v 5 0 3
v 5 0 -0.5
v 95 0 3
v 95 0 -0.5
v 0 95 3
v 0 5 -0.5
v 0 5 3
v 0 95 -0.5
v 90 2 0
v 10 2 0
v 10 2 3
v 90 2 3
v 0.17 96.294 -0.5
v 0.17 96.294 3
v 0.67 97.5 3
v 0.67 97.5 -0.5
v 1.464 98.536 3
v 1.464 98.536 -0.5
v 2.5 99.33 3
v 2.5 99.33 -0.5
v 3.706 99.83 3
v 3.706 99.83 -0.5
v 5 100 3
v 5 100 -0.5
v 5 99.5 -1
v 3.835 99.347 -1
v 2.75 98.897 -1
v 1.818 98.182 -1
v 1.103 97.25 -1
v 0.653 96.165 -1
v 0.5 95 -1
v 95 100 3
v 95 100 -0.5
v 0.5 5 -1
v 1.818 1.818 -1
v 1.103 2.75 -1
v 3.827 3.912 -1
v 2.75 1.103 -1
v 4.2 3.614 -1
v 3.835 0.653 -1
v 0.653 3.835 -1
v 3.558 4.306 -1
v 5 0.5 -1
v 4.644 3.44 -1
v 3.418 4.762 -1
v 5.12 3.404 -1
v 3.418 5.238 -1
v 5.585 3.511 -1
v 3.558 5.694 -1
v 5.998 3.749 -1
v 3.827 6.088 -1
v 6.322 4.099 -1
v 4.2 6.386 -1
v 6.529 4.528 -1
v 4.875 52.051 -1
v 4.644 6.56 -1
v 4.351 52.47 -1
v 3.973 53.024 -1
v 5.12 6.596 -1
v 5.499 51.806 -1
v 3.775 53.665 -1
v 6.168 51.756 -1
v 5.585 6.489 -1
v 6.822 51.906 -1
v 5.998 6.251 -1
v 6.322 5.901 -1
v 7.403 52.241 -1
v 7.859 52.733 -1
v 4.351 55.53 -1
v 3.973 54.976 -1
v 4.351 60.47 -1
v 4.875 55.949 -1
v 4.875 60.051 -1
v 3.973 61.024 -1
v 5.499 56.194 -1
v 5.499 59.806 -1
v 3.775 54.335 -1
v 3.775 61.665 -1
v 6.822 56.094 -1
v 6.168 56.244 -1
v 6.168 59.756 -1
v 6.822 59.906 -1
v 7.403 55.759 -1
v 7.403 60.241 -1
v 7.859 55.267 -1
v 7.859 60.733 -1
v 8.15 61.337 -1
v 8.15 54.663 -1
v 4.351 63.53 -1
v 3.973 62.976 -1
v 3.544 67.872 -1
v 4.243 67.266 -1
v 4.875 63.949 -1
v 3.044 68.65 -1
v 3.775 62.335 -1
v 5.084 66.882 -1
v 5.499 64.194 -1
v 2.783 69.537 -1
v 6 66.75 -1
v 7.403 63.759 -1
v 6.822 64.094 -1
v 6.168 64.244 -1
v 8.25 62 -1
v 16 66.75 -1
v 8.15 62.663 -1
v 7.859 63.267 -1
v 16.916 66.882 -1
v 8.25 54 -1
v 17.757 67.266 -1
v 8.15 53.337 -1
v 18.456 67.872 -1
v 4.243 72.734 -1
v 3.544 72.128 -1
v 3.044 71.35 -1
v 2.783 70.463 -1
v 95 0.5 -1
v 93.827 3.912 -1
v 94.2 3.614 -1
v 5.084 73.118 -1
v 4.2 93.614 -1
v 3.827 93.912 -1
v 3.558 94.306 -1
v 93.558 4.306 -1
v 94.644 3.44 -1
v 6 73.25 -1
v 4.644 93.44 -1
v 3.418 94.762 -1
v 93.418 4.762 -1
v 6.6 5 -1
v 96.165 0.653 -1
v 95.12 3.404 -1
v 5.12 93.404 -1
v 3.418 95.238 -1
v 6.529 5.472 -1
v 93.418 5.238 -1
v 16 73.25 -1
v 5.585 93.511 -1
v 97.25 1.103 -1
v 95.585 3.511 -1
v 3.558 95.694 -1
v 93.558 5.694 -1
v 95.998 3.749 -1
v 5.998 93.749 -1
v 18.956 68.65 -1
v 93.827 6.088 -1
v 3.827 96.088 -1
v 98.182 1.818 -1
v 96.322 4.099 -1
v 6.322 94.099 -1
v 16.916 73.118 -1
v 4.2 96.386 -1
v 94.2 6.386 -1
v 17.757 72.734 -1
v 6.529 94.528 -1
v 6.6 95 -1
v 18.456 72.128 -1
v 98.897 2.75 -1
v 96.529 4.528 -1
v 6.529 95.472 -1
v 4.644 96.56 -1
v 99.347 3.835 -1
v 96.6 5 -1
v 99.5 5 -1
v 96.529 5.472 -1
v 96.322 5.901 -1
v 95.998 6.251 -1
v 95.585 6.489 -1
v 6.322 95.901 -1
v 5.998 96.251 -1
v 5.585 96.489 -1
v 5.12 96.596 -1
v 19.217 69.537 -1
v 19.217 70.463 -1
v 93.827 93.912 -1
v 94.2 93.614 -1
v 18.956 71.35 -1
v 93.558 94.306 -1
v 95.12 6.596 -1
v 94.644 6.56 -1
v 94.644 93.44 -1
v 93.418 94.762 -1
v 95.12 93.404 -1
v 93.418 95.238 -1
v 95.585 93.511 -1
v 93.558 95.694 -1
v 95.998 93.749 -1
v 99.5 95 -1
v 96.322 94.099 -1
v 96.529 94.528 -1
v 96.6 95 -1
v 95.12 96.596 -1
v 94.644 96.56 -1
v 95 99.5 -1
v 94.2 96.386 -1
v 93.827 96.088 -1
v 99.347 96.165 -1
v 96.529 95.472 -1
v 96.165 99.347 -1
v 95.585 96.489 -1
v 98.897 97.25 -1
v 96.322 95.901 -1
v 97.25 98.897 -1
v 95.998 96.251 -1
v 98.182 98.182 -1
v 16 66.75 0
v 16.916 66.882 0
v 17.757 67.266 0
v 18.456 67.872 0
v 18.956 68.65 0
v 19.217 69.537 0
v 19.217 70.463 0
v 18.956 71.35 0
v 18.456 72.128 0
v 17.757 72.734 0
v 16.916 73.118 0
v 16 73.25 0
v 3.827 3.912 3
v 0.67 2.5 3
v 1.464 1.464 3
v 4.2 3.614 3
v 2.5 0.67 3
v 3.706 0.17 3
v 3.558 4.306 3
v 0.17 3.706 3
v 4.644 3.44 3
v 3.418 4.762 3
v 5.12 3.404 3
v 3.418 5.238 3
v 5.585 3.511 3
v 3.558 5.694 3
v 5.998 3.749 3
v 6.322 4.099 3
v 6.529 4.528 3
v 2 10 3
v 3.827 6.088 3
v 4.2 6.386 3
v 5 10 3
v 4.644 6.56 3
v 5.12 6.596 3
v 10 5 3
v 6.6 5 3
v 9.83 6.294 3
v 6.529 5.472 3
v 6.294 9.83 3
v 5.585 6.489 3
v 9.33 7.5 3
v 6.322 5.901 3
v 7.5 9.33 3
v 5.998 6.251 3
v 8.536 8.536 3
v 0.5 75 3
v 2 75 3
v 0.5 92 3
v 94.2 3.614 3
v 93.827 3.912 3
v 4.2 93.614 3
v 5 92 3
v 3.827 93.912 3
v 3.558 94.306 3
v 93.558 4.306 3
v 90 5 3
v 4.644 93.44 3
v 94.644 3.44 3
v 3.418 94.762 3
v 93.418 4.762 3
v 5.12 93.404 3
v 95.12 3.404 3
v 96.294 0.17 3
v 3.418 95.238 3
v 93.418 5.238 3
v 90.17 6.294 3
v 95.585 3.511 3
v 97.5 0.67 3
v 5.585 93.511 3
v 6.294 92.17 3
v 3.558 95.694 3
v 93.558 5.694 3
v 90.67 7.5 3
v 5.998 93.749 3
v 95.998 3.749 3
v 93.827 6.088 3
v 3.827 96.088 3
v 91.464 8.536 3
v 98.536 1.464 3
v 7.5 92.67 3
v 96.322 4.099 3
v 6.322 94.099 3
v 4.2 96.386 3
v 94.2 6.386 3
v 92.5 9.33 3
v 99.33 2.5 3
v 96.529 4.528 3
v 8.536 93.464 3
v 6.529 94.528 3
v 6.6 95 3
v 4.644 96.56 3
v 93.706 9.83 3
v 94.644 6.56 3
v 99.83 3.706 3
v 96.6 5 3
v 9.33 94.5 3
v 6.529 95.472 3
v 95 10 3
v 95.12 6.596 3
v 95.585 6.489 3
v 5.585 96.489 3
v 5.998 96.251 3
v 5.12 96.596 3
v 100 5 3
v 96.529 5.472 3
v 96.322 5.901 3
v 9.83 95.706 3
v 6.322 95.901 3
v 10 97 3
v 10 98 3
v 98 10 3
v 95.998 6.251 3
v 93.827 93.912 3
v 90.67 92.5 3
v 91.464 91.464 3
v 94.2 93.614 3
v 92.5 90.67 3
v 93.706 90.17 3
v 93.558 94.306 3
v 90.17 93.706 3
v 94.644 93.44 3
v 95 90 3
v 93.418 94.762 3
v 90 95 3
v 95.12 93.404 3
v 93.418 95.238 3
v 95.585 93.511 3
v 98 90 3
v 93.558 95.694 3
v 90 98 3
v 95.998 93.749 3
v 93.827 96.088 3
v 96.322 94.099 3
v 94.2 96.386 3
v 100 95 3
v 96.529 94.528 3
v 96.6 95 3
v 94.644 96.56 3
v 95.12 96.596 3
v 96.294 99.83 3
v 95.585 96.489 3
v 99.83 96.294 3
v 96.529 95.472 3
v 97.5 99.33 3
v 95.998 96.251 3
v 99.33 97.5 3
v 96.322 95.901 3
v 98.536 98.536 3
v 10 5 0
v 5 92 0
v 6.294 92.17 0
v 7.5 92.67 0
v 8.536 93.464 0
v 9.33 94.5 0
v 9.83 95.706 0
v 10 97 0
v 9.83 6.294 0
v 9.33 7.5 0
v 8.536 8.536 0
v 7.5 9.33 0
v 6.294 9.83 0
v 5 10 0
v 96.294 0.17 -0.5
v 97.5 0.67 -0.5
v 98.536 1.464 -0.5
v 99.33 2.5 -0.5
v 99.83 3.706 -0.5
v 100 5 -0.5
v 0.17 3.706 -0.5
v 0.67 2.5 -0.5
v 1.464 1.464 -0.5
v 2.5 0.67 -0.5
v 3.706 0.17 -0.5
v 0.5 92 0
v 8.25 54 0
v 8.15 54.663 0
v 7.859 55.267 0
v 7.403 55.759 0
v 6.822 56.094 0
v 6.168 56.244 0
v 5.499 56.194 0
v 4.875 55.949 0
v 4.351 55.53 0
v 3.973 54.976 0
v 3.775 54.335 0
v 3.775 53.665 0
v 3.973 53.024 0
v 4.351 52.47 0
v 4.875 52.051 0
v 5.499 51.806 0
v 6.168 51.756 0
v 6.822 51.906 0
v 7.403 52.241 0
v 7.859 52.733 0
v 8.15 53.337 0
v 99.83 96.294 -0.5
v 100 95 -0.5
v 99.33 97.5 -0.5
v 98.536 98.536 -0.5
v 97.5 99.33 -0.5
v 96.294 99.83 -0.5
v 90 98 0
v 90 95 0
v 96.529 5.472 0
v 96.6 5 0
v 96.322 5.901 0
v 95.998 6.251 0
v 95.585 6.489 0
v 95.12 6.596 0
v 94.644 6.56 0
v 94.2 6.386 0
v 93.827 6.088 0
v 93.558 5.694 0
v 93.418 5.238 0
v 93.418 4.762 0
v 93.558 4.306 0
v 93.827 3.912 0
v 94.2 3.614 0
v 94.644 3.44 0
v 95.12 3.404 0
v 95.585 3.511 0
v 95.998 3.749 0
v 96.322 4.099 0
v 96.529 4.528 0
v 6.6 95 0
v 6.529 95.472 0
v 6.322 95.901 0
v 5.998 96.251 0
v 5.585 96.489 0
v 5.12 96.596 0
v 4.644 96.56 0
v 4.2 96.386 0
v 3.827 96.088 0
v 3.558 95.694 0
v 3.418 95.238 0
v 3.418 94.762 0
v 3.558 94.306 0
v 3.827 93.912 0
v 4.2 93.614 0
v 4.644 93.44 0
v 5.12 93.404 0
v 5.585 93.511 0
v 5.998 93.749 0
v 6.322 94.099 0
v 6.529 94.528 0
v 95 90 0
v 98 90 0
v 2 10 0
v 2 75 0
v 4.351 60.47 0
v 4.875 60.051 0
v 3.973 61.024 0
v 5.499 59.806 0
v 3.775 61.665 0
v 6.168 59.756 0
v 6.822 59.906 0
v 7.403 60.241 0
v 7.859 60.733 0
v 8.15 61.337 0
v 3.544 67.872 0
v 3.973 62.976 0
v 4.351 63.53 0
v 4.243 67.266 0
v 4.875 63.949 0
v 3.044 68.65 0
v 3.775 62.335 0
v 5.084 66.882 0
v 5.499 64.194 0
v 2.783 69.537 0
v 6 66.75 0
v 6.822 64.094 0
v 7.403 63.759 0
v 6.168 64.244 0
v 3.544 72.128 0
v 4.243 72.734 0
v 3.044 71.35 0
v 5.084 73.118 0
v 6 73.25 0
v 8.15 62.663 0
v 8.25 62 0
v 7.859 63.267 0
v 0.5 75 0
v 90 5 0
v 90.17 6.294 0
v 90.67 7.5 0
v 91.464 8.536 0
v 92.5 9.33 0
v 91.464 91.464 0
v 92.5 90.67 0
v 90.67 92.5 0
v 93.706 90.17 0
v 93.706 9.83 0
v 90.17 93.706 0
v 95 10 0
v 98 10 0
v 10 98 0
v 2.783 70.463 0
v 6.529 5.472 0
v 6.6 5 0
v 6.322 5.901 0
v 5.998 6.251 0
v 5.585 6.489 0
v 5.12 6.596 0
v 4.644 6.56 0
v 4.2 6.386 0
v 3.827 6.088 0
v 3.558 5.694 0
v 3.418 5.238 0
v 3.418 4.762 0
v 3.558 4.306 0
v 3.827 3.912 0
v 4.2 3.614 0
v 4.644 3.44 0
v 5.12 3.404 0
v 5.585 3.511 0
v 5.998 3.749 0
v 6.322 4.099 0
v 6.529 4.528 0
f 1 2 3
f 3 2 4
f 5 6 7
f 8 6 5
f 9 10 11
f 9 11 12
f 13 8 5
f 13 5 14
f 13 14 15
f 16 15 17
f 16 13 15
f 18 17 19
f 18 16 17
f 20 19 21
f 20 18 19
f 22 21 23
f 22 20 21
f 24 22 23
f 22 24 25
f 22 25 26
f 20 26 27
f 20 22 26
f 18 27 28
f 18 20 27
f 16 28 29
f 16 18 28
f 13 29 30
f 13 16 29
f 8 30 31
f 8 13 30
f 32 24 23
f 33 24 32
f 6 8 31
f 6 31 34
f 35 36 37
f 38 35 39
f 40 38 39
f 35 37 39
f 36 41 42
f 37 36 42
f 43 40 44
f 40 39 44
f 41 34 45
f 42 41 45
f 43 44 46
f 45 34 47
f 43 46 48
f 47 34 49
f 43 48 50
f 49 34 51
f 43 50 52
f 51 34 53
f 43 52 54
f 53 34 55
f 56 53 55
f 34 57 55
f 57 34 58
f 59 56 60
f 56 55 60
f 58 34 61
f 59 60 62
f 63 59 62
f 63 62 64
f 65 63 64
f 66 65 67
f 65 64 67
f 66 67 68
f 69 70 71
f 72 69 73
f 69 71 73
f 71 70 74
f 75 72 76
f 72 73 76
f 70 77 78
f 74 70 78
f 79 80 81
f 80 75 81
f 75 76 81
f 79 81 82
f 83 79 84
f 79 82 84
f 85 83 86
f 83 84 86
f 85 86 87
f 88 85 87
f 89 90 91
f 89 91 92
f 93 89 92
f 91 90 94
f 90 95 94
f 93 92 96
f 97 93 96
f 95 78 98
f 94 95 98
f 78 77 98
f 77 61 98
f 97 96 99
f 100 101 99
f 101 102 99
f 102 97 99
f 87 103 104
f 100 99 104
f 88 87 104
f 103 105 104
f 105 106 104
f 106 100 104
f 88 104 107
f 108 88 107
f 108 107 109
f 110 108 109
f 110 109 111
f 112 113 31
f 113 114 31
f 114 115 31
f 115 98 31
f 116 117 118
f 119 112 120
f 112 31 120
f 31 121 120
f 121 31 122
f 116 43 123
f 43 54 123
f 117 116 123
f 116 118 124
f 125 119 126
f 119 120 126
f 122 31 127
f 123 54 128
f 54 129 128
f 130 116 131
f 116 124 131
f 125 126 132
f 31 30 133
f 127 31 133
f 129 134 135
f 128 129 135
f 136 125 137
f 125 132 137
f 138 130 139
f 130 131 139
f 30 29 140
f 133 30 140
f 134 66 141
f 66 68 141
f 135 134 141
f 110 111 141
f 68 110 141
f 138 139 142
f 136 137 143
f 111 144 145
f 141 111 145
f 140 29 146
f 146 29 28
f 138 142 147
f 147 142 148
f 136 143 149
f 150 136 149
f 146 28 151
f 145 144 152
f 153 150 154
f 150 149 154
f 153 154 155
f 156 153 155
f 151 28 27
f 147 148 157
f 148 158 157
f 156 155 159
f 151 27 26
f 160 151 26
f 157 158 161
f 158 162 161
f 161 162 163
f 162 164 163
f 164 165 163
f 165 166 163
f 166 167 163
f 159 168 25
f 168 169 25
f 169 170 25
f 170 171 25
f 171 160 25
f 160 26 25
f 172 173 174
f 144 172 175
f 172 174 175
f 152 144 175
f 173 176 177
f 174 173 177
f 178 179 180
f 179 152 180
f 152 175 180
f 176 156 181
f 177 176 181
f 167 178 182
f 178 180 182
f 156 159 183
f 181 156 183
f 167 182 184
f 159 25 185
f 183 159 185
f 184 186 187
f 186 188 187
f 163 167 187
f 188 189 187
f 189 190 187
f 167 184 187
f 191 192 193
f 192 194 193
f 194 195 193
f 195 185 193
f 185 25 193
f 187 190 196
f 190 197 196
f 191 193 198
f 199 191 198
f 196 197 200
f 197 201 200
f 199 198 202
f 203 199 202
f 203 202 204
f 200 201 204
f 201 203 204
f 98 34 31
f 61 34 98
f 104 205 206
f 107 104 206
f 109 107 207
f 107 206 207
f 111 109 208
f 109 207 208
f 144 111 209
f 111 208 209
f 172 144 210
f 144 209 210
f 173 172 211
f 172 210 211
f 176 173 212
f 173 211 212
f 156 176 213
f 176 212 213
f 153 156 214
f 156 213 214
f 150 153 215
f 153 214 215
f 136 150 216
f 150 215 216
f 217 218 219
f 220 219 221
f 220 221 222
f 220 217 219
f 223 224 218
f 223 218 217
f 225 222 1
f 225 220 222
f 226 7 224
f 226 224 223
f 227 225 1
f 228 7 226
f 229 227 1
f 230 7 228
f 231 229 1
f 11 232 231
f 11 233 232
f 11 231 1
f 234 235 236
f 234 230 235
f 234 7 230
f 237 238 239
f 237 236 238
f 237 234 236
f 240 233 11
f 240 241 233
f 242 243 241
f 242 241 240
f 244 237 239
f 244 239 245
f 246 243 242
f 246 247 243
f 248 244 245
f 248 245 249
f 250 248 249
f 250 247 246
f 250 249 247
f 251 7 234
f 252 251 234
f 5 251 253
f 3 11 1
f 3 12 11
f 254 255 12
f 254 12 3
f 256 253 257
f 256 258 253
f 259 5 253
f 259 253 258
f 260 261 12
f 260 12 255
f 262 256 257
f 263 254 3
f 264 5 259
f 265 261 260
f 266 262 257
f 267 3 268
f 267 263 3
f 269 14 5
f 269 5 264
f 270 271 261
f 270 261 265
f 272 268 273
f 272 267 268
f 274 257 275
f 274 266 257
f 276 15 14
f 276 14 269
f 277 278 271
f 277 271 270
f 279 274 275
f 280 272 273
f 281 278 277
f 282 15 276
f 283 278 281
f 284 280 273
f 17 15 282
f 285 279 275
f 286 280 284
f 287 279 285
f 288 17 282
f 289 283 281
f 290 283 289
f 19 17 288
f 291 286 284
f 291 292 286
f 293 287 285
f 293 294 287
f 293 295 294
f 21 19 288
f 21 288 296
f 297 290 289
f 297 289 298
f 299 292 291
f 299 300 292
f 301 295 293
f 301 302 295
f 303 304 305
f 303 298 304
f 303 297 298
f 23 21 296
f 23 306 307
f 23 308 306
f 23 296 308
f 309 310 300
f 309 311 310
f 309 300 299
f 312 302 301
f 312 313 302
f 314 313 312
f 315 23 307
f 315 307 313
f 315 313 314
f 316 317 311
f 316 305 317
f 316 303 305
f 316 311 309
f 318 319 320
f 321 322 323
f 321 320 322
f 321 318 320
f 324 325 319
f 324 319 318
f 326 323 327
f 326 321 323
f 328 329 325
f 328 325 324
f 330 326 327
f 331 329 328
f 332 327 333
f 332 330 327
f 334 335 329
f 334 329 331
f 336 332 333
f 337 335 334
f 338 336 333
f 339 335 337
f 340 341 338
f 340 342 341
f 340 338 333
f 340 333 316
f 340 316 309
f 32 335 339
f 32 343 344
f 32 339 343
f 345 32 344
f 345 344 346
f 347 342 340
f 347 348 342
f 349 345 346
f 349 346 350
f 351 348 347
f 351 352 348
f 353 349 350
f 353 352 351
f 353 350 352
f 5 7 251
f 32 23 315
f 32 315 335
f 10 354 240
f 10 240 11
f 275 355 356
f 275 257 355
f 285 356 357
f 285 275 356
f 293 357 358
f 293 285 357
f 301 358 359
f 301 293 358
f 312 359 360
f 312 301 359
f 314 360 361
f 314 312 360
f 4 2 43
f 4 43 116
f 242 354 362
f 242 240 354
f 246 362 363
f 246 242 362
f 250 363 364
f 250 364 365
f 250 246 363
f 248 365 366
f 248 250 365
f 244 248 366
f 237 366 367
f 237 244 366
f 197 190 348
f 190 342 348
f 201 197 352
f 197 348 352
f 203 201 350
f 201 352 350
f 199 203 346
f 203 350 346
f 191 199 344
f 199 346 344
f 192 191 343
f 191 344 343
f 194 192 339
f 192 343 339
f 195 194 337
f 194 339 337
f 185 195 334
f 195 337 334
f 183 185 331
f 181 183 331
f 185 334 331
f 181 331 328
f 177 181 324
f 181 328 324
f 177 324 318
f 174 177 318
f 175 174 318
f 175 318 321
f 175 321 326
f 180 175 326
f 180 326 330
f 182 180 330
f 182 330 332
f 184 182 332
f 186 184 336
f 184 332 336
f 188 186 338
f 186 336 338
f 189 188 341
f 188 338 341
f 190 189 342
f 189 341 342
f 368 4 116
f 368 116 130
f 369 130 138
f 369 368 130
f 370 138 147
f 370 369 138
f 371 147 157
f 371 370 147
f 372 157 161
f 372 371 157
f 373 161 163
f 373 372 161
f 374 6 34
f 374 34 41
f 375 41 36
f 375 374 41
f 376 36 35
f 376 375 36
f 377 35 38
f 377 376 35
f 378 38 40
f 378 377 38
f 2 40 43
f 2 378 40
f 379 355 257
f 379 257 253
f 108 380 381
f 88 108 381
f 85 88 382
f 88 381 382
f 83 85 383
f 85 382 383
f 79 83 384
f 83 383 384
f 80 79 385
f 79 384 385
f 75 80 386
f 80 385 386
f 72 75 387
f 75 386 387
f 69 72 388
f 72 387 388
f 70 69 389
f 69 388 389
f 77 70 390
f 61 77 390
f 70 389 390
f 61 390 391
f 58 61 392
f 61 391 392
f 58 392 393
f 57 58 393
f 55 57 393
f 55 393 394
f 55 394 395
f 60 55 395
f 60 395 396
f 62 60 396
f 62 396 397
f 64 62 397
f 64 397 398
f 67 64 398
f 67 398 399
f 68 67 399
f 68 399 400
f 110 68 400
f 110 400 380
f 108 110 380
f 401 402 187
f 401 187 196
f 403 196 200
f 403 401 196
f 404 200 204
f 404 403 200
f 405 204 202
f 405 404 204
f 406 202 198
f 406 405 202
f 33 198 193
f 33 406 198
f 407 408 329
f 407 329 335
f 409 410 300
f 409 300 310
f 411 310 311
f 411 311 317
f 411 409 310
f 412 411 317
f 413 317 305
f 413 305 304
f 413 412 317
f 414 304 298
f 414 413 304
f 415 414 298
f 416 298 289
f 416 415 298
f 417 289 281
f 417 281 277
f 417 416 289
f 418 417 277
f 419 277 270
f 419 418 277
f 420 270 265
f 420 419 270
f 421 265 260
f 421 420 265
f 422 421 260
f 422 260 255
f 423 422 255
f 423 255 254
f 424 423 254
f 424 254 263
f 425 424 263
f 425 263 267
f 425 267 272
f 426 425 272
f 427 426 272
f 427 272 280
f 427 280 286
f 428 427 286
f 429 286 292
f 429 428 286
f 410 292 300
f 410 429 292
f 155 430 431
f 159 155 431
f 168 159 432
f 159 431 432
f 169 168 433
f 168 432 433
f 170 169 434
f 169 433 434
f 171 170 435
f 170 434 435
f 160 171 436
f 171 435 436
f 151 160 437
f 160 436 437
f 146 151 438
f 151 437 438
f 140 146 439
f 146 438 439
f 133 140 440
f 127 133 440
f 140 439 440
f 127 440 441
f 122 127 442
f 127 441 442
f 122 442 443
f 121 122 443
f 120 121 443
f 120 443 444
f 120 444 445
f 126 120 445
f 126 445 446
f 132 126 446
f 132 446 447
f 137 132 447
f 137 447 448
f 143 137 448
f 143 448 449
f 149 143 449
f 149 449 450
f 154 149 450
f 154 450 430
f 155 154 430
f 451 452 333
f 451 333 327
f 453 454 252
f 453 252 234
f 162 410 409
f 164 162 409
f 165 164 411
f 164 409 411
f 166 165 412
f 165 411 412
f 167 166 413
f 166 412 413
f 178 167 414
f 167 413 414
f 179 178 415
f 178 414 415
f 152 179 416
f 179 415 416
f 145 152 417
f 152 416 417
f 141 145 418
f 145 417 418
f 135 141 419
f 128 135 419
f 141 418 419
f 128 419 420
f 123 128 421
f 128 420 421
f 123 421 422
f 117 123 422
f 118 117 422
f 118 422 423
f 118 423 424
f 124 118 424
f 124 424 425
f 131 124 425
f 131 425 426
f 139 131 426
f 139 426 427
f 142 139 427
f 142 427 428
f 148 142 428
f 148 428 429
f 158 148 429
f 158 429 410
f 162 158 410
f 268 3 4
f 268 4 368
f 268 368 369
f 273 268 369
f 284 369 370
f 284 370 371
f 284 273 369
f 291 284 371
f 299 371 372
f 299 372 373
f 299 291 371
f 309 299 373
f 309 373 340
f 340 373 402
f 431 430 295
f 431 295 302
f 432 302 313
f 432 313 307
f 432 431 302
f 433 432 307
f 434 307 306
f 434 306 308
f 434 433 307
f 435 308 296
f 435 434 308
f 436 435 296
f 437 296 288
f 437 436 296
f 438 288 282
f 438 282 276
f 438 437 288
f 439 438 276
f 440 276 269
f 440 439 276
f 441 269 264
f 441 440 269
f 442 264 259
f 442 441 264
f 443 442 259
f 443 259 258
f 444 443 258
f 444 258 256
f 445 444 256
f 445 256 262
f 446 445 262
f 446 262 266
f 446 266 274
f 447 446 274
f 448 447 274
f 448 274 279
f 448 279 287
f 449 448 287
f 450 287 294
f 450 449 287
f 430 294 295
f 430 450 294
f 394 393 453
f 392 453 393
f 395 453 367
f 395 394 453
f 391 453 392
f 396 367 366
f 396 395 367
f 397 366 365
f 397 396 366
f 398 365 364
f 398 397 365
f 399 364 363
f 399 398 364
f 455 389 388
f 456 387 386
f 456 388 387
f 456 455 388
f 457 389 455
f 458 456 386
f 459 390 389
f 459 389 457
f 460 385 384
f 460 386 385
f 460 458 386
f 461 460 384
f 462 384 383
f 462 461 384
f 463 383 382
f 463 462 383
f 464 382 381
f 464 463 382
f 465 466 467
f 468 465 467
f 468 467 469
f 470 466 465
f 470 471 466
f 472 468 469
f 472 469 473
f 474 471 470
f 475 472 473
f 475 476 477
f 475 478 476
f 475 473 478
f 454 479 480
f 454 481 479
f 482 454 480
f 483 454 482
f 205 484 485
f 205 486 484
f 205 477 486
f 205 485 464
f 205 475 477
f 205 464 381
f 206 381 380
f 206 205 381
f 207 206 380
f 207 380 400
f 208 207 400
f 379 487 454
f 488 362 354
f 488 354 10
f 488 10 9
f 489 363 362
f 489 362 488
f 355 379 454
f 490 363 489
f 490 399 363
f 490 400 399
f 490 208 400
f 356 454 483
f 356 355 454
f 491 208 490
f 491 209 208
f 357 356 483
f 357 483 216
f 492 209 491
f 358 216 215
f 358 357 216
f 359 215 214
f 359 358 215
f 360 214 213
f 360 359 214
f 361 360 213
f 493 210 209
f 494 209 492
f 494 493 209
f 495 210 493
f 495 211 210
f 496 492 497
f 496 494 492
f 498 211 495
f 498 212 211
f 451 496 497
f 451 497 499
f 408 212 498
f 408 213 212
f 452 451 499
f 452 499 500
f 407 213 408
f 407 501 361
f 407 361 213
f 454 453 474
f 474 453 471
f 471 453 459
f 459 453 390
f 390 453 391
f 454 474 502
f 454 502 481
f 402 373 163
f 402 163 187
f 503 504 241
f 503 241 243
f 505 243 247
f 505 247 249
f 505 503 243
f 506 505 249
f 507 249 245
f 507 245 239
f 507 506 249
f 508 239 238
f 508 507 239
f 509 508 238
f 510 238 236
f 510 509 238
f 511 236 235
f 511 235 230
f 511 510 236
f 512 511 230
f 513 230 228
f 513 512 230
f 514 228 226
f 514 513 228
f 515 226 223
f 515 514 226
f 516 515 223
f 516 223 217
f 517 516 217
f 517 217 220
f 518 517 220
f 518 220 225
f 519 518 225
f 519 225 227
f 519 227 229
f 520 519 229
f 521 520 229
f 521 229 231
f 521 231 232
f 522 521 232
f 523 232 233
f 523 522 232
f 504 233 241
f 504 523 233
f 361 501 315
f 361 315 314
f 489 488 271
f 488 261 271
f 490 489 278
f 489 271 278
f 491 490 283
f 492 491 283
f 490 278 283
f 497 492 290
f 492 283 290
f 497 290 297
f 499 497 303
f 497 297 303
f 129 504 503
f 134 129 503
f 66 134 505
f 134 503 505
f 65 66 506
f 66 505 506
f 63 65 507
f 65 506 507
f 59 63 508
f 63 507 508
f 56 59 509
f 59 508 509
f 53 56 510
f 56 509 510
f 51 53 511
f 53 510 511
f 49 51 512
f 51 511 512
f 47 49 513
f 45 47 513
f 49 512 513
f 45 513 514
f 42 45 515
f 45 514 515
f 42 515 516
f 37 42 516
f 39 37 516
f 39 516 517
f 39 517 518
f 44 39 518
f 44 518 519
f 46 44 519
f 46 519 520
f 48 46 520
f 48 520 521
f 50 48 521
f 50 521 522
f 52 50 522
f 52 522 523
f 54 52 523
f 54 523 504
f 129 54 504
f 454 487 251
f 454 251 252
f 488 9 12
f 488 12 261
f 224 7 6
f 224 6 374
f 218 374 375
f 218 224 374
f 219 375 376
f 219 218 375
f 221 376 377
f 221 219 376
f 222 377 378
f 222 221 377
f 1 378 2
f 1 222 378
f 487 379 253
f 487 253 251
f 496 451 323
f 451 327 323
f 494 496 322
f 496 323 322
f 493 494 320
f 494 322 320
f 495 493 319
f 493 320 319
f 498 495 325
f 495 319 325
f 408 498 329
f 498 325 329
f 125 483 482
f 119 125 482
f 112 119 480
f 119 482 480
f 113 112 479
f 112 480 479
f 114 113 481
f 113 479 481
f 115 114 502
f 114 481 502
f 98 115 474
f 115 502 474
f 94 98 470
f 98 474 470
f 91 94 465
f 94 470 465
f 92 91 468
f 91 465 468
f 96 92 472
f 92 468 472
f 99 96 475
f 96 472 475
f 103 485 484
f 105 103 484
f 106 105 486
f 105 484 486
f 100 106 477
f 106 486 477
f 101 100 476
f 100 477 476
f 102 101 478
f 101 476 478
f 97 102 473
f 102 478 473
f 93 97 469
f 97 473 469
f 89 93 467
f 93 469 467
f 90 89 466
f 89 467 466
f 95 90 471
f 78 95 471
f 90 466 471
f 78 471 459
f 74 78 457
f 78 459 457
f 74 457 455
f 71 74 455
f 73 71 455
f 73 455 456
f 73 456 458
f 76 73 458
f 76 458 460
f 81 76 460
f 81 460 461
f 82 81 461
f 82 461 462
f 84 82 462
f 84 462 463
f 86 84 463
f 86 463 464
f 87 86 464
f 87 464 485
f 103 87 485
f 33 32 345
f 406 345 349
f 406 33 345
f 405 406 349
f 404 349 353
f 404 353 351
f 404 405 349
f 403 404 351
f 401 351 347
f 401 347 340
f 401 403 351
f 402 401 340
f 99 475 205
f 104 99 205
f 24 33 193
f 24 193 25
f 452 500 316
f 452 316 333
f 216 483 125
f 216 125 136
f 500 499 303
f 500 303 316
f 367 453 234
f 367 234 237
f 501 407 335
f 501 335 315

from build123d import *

# Parameters (mm, degrees)
SKETCH_W        = 100
SKETCH_H        = 100
PAD_DEPTH       = 1
SKETCH001_W     = 100
SKETCH001_H     = 100
PAD001_DEPTH    = 3
SKETCH002_R     = 1.6
POCKET_DEPTH    = 3
FILLET_R        = 5
SKETCH004_R     = 2.25
POCKET001_DEPTH = 5
CHAMFER_SIZE    = 0.5


with BuildPart() as part:
    # Sketch → Pad (new body)
    with BuildSketch(Plane.XY):
        with Locations((50, 50)):
            Rectangle(SKETCH_W, SKETCH_H)
    extrude(amount=-PAD_DEPTH)

    # Sketch001 → Pad001 (join)
    with BuildSketch(Plane.XY):
        with Locations((50, 50)):
            Rectangle(SKETCH001_W, SKETCH001_H)
        Polygon((10, 10), (10, 2), (90, 2), (90, 10), (98, 10), (98, 90), (90, 90), (90, 98), (10, 98), (10, 92), (0.5, 92), (0.5, 75), (2, 75), (2, 10), align=None, mode=Mode.SUBTRACT)
    extrude(amount=PAD001_DEPTH)

    # Sketch002 → Pocket (cut, symmetric)
    with BuildSketch(Plane.XY):
        with Locations((5, 95)):
            Circle(SKETCH002_R)
        with Locations((5, 5)):
            Circle(SKETCH002_R)
        with Locations((95, 5)):
            Circle(SKETCH002_R)
        with Locations((95, 95)):
            Circle(SKETCH002_R)
    extrude(amount=POCKET_DEPTH, both=True, mode=Mode.SUBTRACT)

    # Fillet
    fillet_edges = [part.edges().sort_by_distance(p)[0] for p in [
        (100, 100, 1.5),
        (100, 0, 1.5),
        (0, 0, 1.5),
        (0, 100, 1.5),
        (10, 92, 1.5),
        (10, 10, 1.5),
        (90, 10, 1.5),
        (90, 90, 1.5),
    ]]
    fillet(fillet_edges, radius=FILLET_R)

    # Sketch004 (on DatumPlane) → Pocket001 (cut)
    with BuildSketch(Plane.XY):
        with Locations((6, 62)):
            Circle(SKETCH004_R)
        with Locations((6, 54)):
            Circle(SKETCH004_R)
        with BuildLine():
            ThreePointArc((6, 73.25), (2.75, 70), (6, 66.75))
            Line((6, 66.75), (16, 66.75))
            ThreePointArc((16, 66.75), (19.25, 70), (16, 73.25))
            Line((6, 73.25), (16, 73.25))
        make_face()
    extrude(amount=-POCKET001_DEPTH, mode=Mode.SUBTRACT)

    # Chamfer
    chamfer_edges = [part.edges().sort_by_distance(p)[0] for p in [
        (50, 0, -1),
    ]]
    chamfer(chamfer_edges, length=CHAMFER_SIZE)


solid = part.part
